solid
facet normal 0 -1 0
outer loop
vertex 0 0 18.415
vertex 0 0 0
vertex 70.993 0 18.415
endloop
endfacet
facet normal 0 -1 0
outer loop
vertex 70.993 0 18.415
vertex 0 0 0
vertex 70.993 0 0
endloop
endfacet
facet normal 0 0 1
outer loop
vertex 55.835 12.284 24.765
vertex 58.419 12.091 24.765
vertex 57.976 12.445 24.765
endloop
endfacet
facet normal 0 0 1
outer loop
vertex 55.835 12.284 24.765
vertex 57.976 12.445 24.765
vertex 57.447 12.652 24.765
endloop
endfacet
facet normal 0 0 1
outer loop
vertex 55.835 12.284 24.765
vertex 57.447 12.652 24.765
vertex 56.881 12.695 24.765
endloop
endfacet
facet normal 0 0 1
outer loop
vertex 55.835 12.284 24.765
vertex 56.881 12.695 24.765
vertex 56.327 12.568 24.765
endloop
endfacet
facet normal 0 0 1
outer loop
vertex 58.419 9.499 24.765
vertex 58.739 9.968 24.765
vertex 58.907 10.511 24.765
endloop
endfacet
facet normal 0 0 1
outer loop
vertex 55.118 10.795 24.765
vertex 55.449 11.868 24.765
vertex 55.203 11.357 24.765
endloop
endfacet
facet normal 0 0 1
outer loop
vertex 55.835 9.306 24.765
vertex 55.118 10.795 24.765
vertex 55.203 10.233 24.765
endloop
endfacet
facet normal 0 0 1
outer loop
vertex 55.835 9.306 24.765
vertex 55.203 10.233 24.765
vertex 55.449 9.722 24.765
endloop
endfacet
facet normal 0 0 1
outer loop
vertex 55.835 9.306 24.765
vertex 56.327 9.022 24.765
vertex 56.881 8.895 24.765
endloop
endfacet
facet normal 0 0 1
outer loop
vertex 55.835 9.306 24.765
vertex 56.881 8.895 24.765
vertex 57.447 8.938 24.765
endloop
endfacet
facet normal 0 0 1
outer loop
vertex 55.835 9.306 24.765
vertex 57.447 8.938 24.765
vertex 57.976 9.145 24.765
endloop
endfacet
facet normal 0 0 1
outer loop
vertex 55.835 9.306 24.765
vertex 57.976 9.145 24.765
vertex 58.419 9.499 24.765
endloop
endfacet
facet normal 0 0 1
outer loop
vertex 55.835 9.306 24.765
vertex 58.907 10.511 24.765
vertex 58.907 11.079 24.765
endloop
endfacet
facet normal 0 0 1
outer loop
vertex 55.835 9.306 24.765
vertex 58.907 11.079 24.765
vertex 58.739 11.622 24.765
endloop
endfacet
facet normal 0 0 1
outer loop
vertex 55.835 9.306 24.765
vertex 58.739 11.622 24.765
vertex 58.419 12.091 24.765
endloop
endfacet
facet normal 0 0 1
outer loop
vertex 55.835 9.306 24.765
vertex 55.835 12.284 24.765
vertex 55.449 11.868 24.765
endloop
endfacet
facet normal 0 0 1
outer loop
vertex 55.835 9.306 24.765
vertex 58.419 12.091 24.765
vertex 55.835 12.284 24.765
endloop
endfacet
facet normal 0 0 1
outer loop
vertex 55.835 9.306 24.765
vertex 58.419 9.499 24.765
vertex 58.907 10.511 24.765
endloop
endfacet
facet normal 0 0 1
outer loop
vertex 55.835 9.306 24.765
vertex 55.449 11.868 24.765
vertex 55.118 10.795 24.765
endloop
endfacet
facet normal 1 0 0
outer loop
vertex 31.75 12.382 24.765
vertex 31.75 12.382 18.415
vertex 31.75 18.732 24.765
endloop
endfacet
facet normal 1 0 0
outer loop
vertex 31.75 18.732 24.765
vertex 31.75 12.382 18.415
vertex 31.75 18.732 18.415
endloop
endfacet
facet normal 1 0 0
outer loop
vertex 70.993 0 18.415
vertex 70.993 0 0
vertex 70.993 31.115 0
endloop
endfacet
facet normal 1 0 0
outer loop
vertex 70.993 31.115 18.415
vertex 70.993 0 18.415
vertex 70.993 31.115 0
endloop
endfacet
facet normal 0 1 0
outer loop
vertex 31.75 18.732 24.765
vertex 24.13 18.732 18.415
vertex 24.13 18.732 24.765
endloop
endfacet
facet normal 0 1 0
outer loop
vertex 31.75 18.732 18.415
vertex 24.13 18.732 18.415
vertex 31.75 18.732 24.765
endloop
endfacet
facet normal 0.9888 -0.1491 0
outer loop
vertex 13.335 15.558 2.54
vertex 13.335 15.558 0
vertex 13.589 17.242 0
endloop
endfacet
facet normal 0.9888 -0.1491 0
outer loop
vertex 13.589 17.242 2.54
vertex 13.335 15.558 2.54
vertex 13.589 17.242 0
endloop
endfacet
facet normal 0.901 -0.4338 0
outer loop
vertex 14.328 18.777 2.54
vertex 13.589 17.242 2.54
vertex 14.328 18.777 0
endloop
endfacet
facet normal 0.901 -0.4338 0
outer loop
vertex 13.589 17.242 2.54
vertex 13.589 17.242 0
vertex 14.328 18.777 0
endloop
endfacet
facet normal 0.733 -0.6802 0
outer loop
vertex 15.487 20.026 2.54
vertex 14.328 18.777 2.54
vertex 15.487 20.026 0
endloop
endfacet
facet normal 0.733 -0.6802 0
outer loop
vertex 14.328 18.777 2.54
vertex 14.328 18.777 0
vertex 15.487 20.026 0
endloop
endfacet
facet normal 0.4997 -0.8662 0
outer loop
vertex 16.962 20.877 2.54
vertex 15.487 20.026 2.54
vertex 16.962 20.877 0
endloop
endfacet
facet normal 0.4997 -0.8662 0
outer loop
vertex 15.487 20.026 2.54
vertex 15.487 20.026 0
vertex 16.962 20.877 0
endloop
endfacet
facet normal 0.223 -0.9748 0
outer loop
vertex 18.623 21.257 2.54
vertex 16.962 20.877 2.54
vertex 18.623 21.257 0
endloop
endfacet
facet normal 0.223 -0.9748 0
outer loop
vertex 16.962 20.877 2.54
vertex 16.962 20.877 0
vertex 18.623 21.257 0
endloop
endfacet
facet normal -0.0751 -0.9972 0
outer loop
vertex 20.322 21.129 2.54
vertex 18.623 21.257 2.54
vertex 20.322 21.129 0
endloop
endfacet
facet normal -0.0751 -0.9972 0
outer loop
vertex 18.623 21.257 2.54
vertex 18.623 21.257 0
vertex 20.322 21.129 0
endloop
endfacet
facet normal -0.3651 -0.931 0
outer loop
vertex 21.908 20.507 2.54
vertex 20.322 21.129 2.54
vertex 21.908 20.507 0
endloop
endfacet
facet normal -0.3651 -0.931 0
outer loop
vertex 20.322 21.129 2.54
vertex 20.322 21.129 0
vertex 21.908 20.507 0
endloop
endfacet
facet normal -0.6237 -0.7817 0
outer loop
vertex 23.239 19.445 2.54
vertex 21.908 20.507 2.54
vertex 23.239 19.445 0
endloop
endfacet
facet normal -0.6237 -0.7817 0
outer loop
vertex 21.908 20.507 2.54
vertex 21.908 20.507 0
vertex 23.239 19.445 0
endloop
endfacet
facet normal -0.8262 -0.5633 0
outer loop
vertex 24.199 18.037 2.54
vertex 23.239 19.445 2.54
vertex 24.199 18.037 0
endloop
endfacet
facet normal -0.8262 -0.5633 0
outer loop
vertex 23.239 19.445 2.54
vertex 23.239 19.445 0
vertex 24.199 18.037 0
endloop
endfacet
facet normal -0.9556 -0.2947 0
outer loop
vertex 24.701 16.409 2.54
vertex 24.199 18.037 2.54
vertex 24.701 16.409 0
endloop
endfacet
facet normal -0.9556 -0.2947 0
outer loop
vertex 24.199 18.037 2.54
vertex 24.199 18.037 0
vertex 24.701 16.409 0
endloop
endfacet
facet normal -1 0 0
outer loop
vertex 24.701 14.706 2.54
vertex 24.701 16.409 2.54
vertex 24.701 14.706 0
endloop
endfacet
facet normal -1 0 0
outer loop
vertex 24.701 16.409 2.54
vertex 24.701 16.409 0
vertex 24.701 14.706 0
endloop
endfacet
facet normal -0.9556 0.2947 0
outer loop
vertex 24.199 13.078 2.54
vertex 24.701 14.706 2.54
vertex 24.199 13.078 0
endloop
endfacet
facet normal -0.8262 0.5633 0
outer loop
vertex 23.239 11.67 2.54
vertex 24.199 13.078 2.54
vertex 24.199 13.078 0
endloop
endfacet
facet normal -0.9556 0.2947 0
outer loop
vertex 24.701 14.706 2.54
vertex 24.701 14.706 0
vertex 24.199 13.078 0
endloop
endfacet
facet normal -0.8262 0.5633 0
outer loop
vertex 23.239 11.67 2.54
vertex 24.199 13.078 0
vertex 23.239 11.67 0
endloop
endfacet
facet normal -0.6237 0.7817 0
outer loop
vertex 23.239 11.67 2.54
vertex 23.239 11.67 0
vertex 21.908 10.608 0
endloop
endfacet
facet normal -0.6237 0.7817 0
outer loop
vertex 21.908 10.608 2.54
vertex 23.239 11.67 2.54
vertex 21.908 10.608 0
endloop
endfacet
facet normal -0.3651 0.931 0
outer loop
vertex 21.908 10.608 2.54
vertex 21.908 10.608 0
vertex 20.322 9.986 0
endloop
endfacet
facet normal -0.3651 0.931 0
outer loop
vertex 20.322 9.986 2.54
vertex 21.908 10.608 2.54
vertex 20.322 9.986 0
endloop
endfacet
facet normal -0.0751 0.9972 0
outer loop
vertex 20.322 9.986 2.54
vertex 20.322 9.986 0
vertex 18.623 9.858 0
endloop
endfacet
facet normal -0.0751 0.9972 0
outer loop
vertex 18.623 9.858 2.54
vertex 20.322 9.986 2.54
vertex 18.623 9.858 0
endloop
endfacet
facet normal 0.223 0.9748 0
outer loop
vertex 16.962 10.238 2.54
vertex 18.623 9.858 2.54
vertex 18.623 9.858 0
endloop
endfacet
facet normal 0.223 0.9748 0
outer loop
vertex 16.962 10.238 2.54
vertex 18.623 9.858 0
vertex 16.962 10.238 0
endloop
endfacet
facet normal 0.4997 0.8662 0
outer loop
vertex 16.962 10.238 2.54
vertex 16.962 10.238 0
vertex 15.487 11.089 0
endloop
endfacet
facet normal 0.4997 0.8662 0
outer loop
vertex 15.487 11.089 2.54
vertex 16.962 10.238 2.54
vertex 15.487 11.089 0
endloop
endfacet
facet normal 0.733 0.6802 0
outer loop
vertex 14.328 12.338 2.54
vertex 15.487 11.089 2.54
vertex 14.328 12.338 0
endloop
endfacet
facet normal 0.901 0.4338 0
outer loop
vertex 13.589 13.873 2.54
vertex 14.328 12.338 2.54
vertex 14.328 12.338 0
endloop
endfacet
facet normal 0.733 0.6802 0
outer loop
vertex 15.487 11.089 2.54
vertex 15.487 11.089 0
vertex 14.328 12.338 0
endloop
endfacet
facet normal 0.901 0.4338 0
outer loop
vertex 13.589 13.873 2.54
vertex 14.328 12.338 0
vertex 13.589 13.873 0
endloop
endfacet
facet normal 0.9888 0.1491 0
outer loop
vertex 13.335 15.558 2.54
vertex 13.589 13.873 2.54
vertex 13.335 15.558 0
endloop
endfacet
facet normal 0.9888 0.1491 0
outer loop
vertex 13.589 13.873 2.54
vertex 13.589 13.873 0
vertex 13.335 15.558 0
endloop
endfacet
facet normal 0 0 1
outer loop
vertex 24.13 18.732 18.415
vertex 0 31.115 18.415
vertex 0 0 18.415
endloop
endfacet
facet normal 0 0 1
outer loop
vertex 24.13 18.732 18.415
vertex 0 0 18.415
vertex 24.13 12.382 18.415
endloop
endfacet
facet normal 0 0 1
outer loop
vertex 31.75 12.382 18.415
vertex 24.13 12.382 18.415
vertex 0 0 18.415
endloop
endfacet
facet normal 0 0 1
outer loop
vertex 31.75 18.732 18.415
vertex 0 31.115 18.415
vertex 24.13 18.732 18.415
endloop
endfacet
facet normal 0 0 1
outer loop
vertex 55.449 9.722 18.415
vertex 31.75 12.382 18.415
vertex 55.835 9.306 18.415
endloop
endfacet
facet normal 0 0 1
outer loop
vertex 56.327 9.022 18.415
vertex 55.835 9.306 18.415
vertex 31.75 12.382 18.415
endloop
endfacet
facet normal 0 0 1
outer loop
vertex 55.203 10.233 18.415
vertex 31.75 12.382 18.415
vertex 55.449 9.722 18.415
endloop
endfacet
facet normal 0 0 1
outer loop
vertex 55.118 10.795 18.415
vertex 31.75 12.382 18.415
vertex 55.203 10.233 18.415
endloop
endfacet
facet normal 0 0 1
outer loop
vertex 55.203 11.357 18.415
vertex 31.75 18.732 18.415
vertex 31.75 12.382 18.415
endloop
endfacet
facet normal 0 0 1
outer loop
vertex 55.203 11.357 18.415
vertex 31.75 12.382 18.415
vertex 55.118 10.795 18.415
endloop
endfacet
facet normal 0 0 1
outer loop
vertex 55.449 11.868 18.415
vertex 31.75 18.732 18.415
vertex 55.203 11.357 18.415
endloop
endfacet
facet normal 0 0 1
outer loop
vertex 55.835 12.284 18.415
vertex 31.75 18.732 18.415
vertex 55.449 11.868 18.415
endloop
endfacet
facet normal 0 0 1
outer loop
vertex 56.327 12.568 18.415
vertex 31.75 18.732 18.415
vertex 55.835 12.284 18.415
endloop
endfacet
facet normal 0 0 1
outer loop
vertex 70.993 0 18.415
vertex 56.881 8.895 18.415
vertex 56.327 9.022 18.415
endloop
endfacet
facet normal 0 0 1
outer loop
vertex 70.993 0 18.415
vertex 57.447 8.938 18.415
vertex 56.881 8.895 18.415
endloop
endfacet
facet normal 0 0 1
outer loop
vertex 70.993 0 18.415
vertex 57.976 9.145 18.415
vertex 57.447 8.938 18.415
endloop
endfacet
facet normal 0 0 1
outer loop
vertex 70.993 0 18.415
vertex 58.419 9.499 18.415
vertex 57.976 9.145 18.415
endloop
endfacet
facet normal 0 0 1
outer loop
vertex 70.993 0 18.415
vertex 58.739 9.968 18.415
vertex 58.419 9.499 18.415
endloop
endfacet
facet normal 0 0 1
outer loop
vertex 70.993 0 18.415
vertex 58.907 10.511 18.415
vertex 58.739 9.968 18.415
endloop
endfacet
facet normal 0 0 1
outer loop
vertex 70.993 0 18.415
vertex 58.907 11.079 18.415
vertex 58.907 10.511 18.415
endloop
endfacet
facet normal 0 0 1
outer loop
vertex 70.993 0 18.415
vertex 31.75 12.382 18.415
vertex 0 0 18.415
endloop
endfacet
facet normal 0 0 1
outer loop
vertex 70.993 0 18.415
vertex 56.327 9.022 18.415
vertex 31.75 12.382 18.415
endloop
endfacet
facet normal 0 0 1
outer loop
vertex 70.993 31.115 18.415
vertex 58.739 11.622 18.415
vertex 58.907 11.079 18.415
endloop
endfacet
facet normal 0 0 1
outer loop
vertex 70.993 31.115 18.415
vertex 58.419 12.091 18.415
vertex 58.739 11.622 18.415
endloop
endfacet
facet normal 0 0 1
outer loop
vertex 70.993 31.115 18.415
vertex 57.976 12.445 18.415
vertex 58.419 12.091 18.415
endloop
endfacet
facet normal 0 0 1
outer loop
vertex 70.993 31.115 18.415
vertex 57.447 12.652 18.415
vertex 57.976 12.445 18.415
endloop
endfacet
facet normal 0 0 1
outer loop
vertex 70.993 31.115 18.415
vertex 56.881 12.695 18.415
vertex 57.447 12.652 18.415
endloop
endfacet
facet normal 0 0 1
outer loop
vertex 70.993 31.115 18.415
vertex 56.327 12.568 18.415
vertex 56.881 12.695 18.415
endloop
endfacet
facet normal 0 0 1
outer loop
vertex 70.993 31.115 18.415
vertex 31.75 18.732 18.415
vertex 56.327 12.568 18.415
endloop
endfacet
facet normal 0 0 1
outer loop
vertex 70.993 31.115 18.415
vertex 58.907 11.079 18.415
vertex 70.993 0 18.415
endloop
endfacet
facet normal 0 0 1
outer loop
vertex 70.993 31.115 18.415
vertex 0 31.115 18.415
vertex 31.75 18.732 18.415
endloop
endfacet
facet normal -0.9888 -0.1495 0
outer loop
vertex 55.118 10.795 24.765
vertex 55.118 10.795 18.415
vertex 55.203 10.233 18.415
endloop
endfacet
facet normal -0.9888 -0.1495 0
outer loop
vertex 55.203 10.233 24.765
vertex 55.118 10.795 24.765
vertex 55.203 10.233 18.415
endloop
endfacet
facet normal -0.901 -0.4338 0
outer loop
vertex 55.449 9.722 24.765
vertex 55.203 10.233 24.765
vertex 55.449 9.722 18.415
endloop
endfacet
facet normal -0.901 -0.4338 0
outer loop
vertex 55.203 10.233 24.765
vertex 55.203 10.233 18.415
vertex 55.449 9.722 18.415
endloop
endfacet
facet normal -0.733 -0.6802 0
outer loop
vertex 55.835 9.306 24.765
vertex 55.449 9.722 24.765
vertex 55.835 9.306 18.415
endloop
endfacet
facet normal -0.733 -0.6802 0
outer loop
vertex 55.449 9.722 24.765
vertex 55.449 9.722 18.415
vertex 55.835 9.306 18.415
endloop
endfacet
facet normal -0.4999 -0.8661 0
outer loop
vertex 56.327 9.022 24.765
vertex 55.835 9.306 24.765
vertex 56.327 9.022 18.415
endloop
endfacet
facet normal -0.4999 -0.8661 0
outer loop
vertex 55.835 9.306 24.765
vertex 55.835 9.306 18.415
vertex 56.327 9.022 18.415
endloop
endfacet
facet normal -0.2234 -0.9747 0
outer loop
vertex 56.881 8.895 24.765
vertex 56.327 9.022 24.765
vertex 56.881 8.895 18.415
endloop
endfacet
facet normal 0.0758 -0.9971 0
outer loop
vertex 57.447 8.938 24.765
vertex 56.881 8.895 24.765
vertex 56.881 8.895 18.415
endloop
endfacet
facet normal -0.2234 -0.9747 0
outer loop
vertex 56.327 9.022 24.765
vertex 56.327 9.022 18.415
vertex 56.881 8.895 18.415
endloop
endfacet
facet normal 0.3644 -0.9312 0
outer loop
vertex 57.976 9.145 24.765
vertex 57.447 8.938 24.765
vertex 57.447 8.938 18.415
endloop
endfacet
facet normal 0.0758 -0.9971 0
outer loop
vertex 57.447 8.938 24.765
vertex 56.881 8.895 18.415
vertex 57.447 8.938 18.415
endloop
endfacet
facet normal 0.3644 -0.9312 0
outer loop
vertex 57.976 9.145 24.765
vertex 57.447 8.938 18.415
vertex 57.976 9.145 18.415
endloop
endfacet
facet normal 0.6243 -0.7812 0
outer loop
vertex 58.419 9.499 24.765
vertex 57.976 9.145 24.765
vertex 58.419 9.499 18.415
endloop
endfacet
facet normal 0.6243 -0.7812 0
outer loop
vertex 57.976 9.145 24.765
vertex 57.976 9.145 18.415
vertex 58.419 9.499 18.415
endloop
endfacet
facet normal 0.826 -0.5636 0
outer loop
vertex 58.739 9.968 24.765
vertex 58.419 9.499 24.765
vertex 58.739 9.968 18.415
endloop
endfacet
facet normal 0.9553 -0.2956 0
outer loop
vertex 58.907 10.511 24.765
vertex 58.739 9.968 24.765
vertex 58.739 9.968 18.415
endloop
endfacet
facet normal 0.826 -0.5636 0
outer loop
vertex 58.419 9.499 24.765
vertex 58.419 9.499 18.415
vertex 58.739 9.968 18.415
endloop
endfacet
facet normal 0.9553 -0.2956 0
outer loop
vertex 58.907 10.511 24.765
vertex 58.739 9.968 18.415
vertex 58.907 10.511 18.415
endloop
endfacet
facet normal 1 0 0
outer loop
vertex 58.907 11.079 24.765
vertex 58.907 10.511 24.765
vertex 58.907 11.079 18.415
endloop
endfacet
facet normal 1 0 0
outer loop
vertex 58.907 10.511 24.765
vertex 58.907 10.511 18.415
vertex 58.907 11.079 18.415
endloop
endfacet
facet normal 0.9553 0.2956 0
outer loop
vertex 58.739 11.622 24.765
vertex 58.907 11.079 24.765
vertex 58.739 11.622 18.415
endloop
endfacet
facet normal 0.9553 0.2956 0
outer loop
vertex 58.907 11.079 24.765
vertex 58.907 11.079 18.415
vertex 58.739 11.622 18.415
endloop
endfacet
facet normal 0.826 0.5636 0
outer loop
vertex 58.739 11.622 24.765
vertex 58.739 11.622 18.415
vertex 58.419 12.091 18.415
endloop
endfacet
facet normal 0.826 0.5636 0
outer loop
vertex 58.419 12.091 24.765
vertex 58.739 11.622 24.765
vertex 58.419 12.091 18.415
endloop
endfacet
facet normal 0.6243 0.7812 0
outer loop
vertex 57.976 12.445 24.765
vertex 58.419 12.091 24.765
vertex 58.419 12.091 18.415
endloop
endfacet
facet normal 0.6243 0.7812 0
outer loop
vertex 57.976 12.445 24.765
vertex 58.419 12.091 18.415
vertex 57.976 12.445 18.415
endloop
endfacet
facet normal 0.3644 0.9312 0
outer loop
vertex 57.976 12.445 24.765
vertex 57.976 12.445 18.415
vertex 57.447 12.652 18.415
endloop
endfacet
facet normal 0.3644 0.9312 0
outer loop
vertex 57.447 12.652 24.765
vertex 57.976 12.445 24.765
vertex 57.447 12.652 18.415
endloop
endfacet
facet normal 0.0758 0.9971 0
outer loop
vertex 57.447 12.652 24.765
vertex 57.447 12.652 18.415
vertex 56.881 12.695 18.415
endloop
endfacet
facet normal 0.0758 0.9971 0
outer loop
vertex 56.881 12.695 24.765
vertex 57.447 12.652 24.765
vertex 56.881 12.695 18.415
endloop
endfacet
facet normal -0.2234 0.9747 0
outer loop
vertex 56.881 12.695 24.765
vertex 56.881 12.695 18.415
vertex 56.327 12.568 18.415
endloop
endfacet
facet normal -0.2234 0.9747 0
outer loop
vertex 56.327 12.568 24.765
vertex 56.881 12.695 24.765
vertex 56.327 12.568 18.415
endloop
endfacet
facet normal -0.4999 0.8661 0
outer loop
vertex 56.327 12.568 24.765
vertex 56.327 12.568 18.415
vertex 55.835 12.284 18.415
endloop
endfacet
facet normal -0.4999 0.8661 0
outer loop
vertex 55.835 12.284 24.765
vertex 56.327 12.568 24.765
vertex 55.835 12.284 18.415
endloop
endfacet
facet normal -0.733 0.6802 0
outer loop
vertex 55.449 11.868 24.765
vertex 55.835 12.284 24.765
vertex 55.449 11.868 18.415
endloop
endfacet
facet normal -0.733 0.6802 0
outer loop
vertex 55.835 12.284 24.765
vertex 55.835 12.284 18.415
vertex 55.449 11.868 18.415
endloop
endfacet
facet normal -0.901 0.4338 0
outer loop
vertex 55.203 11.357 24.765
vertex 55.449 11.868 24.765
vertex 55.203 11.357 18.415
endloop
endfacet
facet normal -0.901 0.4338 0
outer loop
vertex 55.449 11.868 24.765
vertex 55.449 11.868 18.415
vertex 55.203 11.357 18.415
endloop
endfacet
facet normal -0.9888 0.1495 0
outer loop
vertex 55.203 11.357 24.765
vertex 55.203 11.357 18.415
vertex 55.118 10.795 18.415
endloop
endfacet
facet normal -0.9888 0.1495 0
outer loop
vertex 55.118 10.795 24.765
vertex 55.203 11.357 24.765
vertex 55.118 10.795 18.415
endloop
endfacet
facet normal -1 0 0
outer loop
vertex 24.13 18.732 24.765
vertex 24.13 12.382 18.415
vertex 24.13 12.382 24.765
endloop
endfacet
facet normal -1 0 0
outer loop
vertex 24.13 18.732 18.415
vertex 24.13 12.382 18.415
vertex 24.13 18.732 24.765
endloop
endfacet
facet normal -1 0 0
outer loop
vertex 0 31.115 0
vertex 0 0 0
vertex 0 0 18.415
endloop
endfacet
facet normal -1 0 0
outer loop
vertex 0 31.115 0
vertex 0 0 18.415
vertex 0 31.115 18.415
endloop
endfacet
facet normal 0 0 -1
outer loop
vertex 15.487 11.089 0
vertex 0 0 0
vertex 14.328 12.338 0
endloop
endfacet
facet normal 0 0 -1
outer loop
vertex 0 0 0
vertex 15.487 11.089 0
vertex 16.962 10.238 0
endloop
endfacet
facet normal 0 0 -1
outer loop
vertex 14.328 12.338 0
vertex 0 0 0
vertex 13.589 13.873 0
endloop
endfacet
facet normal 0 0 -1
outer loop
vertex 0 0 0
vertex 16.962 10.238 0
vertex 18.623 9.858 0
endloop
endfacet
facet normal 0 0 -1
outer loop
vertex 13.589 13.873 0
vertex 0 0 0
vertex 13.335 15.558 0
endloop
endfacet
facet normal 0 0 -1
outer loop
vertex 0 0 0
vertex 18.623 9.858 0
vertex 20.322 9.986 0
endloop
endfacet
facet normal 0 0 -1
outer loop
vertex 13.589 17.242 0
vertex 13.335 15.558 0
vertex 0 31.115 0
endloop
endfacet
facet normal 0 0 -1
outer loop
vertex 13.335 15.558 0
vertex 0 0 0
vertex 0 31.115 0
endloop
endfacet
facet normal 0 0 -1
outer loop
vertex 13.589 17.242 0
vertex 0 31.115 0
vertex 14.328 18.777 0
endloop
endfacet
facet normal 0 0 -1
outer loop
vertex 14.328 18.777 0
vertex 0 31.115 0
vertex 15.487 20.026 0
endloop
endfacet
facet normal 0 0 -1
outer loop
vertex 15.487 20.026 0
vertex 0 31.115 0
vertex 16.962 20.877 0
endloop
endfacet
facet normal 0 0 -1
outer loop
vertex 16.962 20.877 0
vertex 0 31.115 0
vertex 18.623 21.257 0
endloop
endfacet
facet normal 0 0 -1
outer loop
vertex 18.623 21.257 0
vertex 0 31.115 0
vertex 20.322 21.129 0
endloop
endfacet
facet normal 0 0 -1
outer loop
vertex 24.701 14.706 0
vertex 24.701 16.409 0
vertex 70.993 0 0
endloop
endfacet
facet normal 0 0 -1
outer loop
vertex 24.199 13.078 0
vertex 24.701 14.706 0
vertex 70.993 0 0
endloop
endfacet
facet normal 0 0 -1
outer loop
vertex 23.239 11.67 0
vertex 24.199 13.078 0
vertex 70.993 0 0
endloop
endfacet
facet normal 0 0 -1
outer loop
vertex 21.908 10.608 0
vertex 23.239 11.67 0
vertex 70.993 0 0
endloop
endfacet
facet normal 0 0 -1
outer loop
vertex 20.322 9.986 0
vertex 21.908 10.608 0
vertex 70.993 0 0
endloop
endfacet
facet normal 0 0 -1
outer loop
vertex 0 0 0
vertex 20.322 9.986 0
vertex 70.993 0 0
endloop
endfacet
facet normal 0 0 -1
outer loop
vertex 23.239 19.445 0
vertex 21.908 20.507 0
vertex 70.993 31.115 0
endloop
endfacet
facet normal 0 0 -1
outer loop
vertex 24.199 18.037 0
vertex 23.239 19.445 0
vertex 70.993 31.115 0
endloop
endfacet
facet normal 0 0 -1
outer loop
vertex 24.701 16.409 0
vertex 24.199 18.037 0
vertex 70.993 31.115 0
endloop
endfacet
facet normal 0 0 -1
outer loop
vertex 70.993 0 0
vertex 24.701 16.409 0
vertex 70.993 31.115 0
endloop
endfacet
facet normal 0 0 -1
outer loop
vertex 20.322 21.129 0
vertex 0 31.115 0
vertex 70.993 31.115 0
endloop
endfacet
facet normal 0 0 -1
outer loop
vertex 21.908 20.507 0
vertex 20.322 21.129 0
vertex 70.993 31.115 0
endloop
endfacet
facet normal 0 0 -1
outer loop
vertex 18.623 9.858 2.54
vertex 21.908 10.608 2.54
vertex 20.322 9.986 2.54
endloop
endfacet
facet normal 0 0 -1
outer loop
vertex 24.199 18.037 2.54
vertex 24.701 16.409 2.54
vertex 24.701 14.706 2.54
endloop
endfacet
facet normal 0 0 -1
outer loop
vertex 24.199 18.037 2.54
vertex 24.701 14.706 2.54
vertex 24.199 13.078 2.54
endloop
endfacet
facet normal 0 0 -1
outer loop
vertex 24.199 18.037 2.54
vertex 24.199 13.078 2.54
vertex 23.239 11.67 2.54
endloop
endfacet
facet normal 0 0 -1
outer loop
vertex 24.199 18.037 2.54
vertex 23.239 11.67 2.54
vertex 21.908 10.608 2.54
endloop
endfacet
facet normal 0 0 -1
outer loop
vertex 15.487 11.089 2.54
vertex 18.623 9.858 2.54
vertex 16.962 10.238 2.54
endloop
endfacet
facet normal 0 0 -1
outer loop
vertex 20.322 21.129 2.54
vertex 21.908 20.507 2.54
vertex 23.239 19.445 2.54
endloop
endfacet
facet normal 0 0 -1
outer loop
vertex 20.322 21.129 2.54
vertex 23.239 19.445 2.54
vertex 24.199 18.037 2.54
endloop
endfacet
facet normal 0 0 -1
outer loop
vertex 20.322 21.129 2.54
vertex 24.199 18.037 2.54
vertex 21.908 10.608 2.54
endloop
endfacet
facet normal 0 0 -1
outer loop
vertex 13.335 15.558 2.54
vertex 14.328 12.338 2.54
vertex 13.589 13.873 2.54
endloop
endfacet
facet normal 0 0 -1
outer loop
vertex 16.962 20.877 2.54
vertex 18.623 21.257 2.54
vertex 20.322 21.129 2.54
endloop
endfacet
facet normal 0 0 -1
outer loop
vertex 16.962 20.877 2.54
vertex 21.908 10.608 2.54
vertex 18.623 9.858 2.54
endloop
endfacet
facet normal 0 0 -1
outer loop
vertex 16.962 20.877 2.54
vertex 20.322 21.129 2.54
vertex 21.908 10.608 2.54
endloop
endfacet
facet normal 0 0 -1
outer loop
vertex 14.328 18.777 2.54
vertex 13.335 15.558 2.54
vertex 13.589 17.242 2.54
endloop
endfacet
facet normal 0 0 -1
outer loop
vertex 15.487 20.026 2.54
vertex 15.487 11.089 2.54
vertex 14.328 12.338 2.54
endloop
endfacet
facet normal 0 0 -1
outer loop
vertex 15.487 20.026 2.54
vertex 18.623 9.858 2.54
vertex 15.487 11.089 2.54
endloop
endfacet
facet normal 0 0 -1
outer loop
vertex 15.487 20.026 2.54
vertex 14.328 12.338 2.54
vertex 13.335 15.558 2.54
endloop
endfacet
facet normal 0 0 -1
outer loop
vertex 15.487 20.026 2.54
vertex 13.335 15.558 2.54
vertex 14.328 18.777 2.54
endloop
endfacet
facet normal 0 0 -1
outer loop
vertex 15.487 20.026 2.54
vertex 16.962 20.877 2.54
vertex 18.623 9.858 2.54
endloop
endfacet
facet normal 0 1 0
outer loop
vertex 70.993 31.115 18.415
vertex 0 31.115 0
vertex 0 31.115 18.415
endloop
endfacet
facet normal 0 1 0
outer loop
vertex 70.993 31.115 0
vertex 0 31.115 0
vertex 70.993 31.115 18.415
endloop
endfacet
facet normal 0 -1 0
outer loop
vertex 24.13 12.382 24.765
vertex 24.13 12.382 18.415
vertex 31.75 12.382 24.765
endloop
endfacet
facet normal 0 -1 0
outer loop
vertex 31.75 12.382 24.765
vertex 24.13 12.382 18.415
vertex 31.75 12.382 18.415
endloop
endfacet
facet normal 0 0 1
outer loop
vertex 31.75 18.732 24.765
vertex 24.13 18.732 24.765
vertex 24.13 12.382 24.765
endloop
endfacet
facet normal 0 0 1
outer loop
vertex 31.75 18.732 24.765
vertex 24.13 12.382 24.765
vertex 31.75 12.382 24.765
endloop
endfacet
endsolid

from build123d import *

# Parameters (mm, degrees)
SKETCH1_W           = 70.993
SKETCH1_H           = 31.115
BOSS_EXTRUDE1_DEPTH = 18.415
SKETCH2_R           = 1.905
SKETCH2_W           = 7.62
SKETCH2_H           = 6.35
BOSS_EXTRUDE2_DEPTH = 6.35
SKETCH3_R           = 5.715
CUT_EXTRUDE1_DEPTH  = 2.54


with BuildPart() as part:
    # Sketch1 → Boss-Extrude1 (new body)
    with BuildSketch(Plane.XY):
        with Locations((35.4965, 15.5575)):
            Rectangle(SKETCH1_W, SKETCH1_H)
    extrude(amount=BOSS_EXTRUDE1_DEPTH)

    # Sketch2 → Boss-Extrude2 (add)
    with BuildSketch(Plane.XY.offset(18.415)):
        with Locations(Location((57.023, 10.794999954, 0), (0, 0, 180))):
            Circle(SKETCH2_R)
        with Locations((27.94, 15.5575)):
            Rectangle(SKETCH2_W, SKETCH2_H)
    extrude(amount=BOSS_EXTRUDE2_DEPTH)

    # Sketch3 → Cut-Extrude1 (cut)
    with BuildSketch(Plane(origin=(0, 0, 0), x_dir=(-1, 0, 0), z_dir=(0, 0, -1))):
        with Locations((-19.05, 15.5575)):
            Circle(SKETCH3_R)
    extrude(amount=-CUT_EXTRUDE1_DEPTH, mode=Mode.SUBTRACT)


solid = part.part
